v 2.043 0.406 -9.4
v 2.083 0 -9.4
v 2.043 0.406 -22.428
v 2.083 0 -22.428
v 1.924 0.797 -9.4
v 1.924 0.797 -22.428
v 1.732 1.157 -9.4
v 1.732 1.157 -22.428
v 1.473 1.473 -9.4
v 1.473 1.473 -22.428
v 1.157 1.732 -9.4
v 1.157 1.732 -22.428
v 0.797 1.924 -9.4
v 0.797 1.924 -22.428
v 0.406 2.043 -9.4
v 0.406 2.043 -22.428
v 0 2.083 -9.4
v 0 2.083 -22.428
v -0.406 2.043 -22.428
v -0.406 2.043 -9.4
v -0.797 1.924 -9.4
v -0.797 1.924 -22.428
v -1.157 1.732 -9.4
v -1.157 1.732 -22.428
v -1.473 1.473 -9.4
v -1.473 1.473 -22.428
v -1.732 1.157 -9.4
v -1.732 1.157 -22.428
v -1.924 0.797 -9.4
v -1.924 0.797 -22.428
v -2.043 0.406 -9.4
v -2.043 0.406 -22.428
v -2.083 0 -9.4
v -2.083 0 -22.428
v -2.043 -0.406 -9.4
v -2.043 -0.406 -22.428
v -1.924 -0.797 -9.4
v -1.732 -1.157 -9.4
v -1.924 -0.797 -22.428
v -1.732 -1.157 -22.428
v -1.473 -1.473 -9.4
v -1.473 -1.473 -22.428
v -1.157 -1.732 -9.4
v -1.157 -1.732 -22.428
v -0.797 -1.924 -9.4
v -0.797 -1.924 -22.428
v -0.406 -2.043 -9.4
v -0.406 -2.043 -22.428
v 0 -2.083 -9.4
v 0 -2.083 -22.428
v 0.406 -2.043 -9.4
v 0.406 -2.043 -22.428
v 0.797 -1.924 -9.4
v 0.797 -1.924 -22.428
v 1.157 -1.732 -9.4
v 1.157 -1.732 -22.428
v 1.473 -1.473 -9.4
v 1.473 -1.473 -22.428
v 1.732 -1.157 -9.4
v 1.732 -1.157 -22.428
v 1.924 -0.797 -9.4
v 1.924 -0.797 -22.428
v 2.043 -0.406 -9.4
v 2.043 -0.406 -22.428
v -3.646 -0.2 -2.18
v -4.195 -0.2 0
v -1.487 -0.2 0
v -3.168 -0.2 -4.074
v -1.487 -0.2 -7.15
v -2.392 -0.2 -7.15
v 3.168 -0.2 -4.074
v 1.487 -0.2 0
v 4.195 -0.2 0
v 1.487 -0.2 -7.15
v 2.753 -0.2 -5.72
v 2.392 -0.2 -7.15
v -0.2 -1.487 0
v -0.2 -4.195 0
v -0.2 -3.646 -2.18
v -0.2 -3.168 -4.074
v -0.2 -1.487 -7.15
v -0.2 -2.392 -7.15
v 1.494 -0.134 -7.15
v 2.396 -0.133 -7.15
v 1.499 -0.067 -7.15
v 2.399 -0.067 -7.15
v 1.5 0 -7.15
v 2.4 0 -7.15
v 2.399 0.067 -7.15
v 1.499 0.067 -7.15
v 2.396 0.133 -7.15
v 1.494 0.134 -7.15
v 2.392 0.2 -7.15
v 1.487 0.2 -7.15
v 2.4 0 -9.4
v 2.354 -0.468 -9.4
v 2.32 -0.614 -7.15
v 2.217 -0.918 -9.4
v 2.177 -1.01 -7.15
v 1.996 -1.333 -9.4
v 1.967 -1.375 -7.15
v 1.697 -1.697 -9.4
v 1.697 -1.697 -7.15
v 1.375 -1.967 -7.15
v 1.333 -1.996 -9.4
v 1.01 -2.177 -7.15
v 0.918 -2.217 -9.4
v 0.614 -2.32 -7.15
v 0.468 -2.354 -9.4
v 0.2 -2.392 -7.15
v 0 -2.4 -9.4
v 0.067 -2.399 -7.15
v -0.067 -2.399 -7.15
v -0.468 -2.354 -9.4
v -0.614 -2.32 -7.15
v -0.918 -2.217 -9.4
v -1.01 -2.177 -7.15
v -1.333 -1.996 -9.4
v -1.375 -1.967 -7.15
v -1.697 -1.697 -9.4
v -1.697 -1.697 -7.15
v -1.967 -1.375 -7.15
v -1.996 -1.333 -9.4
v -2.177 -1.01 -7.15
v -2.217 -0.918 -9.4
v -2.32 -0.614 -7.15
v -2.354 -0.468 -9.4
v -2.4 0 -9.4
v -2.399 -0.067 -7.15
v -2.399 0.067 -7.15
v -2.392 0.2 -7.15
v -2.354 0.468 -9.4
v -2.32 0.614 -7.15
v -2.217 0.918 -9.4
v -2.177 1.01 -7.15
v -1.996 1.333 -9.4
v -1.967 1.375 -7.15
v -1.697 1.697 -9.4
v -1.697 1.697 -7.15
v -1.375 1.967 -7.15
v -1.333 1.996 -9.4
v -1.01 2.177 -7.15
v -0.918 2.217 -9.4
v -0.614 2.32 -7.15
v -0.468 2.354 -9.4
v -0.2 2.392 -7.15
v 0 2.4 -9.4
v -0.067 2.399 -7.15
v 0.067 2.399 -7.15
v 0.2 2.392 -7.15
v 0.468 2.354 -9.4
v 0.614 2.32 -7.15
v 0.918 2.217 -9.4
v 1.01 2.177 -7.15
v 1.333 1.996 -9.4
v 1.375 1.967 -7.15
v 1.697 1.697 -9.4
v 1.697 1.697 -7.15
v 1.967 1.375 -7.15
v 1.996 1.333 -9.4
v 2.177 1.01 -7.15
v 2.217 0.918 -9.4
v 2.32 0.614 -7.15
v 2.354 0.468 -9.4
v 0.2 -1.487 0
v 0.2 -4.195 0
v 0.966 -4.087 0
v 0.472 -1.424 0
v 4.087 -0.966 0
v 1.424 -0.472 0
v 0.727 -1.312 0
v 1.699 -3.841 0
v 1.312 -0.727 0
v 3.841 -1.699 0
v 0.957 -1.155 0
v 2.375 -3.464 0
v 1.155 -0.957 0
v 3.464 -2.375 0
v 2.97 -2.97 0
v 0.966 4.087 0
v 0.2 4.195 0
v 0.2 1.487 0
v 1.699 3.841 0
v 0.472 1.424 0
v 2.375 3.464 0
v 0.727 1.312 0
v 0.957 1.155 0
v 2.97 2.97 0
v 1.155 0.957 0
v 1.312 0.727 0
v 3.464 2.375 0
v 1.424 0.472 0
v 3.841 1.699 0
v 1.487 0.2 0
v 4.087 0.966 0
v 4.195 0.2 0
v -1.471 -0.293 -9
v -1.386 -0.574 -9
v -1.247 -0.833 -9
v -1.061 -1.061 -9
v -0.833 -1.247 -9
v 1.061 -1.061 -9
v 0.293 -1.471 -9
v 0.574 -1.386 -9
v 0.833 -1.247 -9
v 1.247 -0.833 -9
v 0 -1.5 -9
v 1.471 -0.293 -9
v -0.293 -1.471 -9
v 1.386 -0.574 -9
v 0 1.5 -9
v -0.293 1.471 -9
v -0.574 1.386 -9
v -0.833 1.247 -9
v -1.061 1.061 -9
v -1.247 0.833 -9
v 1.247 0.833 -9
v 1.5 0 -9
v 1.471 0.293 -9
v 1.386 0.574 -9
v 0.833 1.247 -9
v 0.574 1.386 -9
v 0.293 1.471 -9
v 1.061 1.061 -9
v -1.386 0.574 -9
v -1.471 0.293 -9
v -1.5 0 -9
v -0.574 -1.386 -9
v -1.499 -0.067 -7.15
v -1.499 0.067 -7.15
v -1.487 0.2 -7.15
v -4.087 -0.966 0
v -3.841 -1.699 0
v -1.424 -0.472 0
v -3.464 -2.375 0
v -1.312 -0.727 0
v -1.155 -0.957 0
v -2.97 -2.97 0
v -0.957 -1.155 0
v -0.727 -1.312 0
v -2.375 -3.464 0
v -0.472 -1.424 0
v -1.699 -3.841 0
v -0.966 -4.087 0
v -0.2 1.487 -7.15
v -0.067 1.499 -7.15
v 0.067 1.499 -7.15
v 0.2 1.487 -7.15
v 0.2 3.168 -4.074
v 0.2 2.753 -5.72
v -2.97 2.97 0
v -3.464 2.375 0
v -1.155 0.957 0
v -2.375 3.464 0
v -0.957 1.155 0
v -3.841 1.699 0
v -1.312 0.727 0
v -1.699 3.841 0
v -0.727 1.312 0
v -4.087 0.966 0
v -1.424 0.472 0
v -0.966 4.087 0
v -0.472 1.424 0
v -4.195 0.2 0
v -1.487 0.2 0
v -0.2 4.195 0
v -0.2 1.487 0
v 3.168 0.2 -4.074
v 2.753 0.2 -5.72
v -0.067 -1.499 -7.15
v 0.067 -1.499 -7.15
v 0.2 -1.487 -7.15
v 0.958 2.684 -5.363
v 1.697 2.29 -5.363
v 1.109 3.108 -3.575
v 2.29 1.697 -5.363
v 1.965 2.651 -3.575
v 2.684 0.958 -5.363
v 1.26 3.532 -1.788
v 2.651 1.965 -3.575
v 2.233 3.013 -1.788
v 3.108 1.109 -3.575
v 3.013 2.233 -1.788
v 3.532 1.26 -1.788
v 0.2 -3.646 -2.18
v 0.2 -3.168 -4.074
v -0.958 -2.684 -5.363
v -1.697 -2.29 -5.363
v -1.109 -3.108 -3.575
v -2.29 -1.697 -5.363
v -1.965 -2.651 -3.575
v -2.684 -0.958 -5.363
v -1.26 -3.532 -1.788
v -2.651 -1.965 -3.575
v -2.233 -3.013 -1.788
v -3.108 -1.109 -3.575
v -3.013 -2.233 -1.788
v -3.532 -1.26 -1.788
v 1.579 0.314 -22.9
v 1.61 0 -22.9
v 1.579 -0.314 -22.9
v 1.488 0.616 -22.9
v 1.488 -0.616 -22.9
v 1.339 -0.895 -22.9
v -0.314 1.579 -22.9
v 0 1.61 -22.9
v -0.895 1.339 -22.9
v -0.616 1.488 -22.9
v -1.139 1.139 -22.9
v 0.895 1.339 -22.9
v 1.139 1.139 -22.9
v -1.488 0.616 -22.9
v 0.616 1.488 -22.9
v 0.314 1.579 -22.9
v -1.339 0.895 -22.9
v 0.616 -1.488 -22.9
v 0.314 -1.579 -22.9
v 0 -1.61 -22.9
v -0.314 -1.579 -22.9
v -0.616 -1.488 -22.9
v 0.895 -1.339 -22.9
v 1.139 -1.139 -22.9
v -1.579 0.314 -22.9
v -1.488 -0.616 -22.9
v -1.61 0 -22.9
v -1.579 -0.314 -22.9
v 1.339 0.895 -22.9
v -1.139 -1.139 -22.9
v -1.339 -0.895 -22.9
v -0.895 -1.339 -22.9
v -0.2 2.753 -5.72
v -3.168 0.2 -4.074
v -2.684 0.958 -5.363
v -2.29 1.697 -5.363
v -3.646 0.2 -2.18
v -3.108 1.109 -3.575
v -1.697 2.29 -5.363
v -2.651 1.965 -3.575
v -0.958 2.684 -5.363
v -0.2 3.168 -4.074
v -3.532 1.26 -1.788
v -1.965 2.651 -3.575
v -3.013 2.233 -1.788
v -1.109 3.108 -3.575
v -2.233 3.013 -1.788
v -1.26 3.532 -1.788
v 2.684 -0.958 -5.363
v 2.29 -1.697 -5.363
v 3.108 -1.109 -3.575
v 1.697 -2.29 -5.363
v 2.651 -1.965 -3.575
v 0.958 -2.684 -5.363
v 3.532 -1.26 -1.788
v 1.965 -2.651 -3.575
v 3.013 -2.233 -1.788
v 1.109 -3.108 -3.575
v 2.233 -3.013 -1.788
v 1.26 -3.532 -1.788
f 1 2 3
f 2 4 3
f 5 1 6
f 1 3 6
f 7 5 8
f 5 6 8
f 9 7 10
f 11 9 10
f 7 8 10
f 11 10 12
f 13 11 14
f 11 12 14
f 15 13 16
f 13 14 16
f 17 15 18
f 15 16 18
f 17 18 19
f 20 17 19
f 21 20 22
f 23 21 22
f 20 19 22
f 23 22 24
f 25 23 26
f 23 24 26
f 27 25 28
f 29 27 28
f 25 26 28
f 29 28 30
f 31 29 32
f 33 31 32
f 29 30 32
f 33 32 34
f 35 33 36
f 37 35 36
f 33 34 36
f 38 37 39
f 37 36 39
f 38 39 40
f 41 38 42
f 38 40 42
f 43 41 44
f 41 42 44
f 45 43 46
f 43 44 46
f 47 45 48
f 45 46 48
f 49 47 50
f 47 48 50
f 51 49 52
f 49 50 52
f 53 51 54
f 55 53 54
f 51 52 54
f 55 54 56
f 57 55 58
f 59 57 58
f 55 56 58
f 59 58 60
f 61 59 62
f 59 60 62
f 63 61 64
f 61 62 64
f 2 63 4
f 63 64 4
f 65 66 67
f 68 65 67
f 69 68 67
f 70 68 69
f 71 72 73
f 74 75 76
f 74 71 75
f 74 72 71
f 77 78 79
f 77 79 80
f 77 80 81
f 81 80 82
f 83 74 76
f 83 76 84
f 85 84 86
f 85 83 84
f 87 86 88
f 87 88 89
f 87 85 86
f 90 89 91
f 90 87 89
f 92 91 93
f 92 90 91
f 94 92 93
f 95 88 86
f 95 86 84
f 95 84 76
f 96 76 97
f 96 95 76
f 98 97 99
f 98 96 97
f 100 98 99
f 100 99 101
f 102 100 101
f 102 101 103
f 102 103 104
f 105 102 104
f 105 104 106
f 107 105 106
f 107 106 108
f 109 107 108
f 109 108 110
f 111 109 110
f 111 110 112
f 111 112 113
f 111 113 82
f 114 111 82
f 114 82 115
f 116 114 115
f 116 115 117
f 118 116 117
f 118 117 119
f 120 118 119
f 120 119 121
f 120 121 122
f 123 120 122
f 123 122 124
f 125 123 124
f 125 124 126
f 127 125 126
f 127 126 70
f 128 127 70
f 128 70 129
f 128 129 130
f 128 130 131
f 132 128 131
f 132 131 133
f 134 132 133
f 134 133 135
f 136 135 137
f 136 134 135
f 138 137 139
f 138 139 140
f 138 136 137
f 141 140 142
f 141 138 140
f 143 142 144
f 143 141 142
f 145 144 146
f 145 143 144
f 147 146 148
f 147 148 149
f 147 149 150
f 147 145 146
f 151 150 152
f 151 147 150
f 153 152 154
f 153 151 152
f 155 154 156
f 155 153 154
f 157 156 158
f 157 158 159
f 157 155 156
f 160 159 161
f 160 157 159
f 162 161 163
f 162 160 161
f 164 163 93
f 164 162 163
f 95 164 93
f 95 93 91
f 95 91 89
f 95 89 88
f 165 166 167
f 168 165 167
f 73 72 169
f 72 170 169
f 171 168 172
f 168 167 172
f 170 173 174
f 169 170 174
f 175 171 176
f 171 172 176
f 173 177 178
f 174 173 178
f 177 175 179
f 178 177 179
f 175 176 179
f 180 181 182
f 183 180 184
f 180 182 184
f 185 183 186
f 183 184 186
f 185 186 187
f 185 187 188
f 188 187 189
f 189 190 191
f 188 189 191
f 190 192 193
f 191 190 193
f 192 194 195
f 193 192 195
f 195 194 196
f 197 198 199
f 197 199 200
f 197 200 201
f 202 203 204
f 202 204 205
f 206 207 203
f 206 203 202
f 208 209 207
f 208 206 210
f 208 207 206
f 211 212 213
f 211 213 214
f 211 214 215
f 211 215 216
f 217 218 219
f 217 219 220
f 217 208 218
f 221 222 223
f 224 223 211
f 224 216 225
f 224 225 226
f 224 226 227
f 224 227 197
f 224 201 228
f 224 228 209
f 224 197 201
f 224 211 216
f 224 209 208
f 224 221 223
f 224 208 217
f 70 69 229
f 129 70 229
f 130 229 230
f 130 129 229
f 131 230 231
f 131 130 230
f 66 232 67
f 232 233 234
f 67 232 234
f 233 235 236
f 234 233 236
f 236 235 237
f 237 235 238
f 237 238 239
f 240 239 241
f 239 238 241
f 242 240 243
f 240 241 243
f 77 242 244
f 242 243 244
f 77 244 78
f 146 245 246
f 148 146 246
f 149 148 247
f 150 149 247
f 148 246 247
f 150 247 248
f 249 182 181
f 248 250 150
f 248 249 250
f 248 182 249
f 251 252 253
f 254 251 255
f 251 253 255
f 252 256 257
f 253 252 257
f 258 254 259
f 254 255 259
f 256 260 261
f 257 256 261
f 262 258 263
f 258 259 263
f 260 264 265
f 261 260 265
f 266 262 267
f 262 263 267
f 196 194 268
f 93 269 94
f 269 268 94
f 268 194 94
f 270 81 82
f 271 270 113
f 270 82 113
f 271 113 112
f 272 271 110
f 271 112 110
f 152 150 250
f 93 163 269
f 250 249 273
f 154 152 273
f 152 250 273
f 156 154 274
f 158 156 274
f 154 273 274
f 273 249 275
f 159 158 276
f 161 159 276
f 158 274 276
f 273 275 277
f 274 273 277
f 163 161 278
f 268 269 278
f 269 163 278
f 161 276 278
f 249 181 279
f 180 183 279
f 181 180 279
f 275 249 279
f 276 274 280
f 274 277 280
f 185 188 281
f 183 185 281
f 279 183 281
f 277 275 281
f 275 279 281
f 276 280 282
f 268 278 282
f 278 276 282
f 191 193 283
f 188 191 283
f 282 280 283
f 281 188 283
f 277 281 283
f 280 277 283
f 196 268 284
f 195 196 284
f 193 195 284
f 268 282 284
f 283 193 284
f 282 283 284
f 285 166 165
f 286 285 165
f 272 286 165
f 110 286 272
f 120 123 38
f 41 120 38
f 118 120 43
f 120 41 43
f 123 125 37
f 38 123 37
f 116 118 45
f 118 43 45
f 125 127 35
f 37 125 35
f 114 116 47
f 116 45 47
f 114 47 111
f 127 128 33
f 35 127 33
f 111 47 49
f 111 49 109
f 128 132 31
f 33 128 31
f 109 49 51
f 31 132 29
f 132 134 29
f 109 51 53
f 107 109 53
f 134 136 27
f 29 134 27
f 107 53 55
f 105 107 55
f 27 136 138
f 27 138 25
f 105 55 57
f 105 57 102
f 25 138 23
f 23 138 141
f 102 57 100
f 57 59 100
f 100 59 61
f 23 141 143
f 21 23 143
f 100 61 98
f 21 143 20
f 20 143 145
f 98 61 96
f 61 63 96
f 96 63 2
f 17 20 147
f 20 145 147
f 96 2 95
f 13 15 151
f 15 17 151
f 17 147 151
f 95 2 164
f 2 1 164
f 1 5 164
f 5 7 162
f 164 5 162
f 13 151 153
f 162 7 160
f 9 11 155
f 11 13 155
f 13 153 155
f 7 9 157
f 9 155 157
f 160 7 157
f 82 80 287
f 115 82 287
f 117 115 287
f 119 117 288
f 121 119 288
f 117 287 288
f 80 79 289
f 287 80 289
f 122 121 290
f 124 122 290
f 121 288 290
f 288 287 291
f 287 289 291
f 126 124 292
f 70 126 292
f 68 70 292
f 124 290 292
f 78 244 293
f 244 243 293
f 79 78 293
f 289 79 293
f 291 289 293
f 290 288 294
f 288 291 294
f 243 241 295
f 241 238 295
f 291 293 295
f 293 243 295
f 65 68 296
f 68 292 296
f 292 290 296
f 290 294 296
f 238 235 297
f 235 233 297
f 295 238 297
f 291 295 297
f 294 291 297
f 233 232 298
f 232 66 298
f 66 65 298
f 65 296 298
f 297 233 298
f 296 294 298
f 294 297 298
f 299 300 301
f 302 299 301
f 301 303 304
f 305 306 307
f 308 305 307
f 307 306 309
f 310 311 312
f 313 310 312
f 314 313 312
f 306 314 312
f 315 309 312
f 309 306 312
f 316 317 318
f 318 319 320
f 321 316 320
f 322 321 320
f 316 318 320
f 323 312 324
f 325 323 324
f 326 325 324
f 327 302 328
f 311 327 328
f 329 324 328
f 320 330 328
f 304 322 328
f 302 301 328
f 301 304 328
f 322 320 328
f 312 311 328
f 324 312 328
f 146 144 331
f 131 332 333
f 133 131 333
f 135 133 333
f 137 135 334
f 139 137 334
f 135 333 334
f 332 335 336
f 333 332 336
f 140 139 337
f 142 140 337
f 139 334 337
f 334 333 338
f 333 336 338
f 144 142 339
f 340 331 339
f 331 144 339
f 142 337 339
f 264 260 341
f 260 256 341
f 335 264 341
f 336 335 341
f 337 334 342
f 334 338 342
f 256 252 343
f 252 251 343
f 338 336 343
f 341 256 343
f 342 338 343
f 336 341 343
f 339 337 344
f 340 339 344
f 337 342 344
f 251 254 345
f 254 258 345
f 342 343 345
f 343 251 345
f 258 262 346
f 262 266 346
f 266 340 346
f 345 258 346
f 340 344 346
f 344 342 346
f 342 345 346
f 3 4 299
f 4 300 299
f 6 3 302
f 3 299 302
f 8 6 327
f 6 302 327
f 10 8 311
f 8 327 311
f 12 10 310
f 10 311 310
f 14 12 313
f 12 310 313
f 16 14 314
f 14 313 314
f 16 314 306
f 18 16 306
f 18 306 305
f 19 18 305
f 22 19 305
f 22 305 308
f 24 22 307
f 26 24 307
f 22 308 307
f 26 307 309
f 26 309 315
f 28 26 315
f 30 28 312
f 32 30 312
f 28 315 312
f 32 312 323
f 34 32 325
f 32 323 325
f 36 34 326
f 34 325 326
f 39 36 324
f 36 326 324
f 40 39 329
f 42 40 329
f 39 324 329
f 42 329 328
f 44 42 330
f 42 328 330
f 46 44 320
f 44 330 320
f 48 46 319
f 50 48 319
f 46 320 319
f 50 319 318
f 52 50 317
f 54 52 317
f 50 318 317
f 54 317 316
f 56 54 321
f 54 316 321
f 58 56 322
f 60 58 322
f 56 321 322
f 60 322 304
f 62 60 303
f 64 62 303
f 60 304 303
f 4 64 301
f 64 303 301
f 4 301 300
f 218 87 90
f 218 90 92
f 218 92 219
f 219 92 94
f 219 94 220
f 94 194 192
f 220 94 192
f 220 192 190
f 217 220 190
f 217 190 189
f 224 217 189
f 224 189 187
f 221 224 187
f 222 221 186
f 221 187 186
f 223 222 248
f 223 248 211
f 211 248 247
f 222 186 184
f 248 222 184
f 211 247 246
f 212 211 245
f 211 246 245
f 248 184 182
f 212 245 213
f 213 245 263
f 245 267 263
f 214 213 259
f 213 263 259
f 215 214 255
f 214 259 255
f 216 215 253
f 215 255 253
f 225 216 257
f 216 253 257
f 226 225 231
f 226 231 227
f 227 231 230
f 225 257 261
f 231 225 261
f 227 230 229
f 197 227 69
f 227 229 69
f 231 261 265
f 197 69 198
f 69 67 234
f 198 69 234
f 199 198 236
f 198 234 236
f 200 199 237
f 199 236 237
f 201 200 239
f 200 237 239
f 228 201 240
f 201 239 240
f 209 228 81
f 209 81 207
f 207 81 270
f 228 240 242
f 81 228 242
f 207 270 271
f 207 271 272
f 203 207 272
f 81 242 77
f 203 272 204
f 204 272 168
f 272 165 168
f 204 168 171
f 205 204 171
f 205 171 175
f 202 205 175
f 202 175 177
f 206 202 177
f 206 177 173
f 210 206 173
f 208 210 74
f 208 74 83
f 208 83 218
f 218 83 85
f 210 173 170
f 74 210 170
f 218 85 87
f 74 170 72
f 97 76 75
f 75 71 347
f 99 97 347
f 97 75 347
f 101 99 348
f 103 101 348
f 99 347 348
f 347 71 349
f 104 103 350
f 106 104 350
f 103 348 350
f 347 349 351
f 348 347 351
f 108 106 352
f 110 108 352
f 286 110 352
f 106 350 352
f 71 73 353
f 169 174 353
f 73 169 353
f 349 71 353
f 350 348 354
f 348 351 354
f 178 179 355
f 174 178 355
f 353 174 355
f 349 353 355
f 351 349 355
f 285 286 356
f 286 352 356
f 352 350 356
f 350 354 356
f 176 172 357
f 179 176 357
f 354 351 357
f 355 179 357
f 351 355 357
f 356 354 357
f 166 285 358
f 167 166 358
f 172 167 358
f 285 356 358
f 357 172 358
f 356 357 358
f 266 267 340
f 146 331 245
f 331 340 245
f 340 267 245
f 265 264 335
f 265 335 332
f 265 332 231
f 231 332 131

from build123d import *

# Parameters (mm, degrees)
CROQUIS1_W                 = 2.4
CROQUIS1_H                 = 22.9
CROQUIS3_R                 = 1.5
CORTAR_EXTRUIR1_DEPTH      = 9
CORTAR_EXTRUIR2_DEPTH      = 12.7
CORTAR_EXTRUIR2_DEPTH_BACK = 14
CROQUIS5_W                 = 0.4
CROQUIS5_H                 = 7.15
CORTAR_EXTRUIR3_DEPTH      = 9.7
CORTAR_EXTRUIR3_DEPTH_BACK = 14
CROQUIS6_W                 = 7.15
CROQUIS6_H                 = 0.4


# Read off the part's stored shape, not the designer's step: #8-32 Roscas Standard Taladro2
with BuildPart() as part:
    # Croquis1 → Revolución1 (revolve)
    with BuildSketch(Plane(origin=(0, 0, 0), x_dir=(1, 0, 0), z_dir=(0, 1, 0))):
        with Locations((1.2, 11.45)):
            Rectangle(CROQUIS1_W, CROQUIS1_H)
    revolve(axis=Axis((0, 0, 0), (0, 0, -1)))

    # Croquis2 → Revolución2 (revolve)
    with BuildSketch(Plane(origin=(0, 0, 0), x_dir=(1, 0, 0), z_dir=(0, 1, 0)), mode=Mode.PRIVATE) as revoluci_n2_sk:
        Polygon((-4.2, 0), (-2.4, 0), (-2.4, 7.15), align=None)
    revolve(revoluci_n2_sk.sketch.rotate(Axis((0, 0, 0), (0, 0, -1)), 180), axis=Axis((0, 0, 0), (0, 0, -1)))

    # Croquis3 → Cortar-Extruir1 (cut)
    with BuildSketch(Plane.XY):
        Circle(CROQUIS3_R)
    extrude(amount=-CORTAR_EXTRUIR1_DEPTH, mode=Mode.SUBTRACT)

    # Croquis5 → Cortar-Extruir2 (cut, two sides: drawn at the far end of the back side and taken through both)
    with BuildSketch(Plane(origin=(0, 0, 0), x_dir=(1, 0, 0), z_dir=(0, 1, 0)).offset(-CORTAR_EXTRUIR2_DEPTH_BACK)):
        with Locations((0, 3.575)):
            Rectangle(CROQUIS5_W, CROQUIS5_H)
    extrude(amount=CORTAR_EXTRUIR2_DEPTH + CORTAR_EXTRUIR2_DEPTH_BACK, mode=Mode.SUBTRACT)

    # Croquis6 → Cortar-Extruir3 (cut, two sides: drawn at the far end of the back side and taken through both)
    with BuildSketch(Plane(origin=(0, 0, 0), x_dir=(0, 0, -1), z_dir=(1, 0, 0)).offset(-CORTAR_EXTRUIR3_DEPTH_BACK)):
        with Locations((3.575, 0)):
            Rectangle(CROQUIS6_W, CROQUIS6_H)
    extrude(amount=CORTAR_EXTRUIR3_DEPTH + CORTAR_EXTRUIR3_DEPTH_BACK, mode=Mode.SUBTRACT)

    # #8-32 Roscas Standard Taladro2 outline → #8-32 Roscas Standard Taladro2 (revolve, cut)
    with BuildSketch(Plane.XZ):
        Polygon((1.61036, -22.9), (2.4, -22.9), (2.4, -9.4), (2.0828, -9.4), (2.0828, -22.42756), align=None)
    revolve(axis=Axis((0, 0, 0), (0, 0, 1)), mode=Mode.SUBTRACT)


solid = part.part
